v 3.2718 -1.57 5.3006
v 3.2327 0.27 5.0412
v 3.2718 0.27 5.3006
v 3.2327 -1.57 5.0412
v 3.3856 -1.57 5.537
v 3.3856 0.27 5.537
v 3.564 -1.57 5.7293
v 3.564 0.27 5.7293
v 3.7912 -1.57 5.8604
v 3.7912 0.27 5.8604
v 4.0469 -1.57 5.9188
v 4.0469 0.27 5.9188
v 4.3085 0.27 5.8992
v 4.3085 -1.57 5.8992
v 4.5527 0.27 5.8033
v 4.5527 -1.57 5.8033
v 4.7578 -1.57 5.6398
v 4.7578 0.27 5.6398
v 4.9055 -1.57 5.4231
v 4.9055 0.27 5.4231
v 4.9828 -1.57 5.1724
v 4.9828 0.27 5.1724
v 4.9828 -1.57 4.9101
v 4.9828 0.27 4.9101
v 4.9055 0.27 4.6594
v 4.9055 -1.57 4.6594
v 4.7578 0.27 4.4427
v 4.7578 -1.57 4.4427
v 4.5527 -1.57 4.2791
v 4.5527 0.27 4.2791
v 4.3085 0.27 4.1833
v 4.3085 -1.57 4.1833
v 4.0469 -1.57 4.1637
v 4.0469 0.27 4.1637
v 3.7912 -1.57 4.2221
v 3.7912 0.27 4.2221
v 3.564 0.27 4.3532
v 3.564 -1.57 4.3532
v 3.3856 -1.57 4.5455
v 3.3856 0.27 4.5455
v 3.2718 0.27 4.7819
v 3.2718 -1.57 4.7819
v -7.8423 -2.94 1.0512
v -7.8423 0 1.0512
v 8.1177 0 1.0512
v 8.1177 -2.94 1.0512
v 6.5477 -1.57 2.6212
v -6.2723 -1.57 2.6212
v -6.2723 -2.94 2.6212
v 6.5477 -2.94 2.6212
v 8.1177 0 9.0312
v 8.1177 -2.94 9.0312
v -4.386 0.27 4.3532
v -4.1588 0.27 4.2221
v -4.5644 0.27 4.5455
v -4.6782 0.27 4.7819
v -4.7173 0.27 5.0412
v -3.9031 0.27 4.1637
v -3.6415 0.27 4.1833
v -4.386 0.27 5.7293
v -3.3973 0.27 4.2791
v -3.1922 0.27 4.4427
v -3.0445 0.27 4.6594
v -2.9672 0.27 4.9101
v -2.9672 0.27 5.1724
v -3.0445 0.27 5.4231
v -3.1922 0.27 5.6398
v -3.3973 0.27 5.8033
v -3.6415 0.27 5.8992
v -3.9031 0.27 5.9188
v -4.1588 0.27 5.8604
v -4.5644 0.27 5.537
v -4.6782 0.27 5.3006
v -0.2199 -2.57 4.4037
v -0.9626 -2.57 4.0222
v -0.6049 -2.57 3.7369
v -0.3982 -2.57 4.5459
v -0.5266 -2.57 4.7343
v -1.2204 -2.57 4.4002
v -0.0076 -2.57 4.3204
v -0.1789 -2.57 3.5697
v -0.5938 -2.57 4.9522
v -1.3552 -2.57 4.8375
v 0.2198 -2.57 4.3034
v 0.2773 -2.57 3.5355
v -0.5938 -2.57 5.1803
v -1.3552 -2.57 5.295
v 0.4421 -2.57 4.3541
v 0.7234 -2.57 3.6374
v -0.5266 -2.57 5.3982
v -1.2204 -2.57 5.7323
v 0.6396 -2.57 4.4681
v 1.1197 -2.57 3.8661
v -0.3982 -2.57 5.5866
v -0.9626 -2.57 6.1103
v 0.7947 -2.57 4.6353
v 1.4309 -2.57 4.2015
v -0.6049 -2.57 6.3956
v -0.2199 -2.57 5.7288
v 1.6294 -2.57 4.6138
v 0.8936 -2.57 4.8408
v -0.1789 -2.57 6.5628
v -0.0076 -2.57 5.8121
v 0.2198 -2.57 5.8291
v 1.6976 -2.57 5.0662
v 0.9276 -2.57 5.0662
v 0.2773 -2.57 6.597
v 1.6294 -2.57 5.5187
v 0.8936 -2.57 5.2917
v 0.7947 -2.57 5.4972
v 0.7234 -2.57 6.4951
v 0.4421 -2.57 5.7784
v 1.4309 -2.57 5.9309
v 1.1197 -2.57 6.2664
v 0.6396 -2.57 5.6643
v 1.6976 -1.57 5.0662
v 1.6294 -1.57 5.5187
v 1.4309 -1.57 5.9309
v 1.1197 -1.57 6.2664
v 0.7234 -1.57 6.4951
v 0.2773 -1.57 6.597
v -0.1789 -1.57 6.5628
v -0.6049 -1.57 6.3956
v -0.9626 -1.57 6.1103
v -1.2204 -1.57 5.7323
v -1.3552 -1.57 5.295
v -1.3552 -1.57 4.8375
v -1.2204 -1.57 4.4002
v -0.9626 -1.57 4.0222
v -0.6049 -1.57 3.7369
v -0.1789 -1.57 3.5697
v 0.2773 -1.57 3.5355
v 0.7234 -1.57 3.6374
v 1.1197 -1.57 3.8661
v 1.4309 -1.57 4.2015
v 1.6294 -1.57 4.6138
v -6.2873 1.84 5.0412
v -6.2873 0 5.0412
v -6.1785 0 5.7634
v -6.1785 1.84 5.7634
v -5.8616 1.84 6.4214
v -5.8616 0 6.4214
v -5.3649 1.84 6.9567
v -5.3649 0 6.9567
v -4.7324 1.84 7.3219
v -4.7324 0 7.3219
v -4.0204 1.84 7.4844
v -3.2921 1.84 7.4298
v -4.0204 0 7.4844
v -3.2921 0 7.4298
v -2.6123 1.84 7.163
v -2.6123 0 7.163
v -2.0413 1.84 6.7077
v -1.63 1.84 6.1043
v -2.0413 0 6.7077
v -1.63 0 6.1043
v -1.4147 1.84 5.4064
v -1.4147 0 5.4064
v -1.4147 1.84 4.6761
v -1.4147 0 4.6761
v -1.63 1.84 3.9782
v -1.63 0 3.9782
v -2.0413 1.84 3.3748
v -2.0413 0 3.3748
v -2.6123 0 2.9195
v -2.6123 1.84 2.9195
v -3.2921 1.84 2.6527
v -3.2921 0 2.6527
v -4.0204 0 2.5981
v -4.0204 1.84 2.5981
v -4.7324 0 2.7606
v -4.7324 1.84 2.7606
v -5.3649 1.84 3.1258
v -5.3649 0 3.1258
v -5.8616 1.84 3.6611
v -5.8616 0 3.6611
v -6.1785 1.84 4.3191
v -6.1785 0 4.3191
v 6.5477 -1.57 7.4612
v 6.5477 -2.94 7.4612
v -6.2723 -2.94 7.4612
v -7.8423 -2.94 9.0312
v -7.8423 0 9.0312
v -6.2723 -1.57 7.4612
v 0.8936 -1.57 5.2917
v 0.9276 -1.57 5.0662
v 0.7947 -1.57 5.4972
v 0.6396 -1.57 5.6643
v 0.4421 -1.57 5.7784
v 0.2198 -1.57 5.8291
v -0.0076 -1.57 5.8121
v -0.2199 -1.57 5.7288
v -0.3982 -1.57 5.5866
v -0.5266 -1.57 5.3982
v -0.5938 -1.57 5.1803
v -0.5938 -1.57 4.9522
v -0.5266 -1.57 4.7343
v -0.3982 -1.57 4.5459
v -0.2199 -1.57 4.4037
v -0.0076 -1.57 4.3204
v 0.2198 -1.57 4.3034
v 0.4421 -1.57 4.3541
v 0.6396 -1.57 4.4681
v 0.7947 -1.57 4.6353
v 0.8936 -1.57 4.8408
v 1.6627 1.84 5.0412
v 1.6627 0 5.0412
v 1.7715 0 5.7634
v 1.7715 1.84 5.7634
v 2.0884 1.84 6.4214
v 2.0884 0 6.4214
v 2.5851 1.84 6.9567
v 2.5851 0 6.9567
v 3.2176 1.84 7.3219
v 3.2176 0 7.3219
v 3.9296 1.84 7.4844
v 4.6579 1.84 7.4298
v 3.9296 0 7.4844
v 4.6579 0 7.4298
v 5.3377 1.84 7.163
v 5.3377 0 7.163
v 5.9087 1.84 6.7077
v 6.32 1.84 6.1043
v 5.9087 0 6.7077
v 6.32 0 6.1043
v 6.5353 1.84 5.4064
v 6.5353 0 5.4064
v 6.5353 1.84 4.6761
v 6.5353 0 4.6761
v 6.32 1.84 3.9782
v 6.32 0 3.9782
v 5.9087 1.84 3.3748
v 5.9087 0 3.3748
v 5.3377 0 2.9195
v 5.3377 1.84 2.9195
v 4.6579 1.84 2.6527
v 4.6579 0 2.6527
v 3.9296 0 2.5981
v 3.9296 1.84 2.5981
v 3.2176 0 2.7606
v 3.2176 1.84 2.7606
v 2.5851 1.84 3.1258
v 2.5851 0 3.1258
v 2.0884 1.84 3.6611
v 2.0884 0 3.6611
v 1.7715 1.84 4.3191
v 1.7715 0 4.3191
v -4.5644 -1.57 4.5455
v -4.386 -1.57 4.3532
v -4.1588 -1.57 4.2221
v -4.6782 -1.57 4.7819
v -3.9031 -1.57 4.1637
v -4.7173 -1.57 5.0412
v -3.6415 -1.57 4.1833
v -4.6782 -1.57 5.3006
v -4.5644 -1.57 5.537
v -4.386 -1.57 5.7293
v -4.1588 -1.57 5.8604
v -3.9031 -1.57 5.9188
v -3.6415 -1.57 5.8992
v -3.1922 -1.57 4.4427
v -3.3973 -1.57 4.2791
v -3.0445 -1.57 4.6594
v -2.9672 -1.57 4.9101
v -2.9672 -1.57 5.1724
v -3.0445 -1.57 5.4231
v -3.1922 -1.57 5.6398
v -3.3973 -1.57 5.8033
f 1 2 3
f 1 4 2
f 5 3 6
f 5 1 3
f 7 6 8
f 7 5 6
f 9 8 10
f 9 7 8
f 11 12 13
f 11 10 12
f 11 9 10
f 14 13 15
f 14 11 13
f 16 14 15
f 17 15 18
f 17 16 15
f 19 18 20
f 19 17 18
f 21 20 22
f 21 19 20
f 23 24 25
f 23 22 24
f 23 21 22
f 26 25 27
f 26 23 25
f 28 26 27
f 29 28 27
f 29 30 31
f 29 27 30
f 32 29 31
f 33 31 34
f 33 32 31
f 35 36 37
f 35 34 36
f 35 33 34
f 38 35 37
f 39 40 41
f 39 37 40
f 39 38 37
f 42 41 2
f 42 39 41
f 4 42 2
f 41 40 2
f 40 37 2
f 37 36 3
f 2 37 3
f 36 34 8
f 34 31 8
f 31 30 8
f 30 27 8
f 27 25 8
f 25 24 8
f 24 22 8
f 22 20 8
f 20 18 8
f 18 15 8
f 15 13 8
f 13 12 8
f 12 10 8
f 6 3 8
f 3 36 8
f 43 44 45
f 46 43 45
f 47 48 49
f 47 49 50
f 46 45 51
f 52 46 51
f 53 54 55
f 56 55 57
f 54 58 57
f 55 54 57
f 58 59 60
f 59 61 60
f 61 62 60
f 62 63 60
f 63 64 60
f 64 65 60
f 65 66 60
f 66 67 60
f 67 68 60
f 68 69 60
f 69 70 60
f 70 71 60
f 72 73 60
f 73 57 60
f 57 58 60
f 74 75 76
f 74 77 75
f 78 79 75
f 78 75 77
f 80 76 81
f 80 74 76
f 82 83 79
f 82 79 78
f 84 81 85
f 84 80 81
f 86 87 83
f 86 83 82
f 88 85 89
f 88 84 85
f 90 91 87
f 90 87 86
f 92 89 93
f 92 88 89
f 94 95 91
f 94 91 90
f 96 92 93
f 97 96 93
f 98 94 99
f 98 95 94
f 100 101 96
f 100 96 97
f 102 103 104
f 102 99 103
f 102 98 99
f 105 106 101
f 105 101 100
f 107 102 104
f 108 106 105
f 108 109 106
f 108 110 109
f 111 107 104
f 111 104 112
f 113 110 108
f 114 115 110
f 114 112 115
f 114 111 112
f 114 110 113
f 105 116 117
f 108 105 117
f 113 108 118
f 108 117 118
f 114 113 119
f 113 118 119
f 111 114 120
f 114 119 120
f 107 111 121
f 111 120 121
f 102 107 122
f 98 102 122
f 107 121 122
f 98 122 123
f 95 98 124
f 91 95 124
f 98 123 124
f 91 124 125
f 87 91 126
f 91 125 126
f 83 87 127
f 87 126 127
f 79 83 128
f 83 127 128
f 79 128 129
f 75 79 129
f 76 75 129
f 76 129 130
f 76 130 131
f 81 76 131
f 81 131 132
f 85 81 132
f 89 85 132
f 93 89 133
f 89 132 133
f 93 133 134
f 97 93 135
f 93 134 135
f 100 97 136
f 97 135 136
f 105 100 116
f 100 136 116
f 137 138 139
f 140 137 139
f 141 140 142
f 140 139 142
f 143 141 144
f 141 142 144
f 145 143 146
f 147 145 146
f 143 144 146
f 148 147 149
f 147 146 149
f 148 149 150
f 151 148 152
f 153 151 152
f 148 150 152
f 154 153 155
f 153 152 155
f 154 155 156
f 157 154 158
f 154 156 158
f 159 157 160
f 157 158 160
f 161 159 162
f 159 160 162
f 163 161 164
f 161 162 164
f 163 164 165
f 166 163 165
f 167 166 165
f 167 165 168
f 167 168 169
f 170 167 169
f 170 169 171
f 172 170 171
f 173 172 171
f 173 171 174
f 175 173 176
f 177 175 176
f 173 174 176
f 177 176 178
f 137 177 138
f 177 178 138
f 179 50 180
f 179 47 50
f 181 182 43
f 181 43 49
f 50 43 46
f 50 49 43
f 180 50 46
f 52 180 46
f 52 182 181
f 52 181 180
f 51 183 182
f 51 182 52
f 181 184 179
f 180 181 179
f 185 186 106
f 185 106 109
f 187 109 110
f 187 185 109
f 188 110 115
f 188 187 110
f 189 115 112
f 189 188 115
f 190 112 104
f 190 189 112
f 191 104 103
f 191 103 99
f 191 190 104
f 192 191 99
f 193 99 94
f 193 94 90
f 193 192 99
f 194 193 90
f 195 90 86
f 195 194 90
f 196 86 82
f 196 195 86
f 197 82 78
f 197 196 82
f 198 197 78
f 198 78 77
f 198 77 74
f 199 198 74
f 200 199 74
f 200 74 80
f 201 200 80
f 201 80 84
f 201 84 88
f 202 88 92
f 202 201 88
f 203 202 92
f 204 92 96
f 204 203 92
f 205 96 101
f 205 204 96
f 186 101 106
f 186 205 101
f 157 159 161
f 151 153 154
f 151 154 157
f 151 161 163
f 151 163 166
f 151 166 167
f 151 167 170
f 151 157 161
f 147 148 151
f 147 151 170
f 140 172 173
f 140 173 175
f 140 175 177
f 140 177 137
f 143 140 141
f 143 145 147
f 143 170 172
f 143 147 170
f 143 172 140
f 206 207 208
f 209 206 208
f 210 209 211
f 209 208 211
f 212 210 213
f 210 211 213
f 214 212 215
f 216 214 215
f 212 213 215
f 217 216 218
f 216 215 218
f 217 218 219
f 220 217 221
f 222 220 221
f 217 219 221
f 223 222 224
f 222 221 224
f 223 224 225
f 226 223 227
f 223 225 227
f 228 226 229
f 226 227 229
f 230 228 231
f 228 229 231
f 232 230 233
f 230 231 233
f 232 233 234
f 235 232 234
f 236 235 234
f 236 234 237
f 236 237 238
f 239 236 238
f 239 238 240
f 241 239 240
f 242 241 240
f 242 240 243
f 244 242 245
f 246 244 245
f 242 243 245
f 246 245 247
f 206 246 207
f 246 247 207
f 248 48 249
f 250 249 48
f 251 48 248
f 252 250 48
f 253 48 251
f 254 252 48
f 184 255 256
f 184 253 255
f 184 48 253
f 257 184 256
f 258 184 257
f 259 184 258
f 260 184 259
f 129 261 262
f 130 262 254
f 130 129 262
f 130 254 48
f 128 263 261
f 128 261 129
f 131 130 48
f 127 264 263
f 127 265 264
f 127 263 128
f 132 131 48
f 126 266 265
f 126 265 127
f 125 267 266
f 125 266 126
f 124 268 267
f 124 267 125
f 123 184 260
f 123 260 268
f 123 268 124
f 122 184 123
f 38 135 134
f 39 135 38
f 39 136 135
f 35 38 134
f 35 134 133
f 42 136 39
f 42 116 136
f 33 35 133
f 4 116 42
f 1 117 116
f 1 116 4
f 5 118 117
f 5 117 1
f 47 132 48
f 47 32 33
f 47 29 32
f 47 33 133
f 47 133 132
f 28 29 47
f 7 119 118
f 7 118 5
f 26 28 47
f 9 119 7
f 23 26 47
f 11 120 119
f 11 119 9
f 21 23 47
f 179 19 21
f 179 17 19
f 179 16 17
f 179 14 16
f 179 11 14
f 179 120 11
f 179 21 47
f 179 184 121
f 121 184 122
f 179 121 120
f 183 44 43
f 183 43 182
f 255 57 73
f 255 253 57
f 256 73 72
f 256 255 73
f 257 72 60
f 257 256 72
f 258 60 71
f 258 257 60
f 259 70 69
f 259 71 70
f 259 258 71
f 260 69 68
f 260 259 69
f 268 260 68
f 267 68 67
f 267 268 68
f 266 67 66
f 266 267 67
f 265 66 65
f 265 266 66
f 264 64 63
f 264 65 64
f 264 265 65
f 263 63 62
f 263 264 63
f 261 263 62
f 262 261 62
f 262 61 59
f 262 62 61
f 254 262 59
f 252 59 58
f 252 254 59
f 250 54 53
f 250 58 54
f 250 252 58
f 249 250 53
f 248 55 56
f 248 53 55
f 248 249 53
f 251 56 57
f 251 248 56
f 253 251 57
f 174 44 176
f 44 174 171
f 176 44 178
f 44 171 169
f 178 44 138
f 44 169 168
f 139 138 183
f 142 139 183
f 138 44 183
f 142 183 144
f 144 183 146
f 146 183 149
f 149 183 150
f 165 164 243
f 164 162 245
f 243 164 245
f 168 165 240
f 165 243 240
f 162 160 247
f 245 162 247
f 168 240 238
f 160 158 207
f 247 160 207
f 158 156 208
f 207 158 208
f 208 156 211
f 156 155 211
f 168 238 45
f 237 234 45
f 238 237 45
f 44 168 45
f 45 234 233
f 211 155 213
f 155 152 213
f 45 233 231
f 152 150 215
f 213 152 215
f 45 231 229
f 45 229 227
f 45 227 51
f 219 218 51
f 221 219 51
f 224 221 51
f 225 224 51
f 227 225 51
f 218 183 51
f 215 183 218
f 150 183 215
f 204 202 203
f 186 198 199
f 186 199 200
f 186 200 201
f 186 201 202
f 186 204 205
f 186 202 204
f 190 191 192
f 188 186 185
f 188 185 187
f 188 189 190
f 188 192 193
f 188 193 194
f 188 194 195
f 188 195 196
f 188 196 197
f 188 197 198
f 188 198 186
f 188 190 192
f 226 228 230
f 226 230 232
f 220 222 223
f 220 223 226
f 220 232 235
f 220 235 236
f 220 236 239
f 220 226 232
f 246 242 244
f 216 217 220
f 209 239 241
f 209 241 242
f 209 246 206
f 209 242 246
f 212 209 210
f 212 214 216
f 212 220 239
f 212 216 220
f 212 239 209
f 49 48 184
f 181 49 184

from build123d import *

# Parameters (mm, degrees)
F0_W     = 15.96
F0_H     = 7.98
F1_DEPTH = 2.94
F2_R     = 2.45
F3_DEPTH = 1.84
F4_T     = -1.57
F5_R     = 1.535
F5_R_2   = 0.765
F6_DEPTH = 1


with BuildPart() as f1:
    # F0 (on Front) → F1 (new body)
    with BuildSketch(Plane.XZ):
        with Locations((0.1376755536, 5.0412456957)):
            Rectangle(F0_W, F0_H)
    extrude(amount=F1_DEPTH)

    # F2 (on face) → F3 (join)
    with BuildSketch(Plane(origin=(0, 0, 0), x_dir=(-1, 0, 0), z_dir=(0, 1, 0))):
        with Locations((3.8373244464, 5.0412456957)):
            Circle(F2_R)
        with Locations((-4.1126755536, 5.0412456957)):
            Circle(F2_R)
    extrude(amount=F3_DEPTH)

    # F4
    f4_openings = [f1.faces().sort_by_distance(p)[0] for p in [
        (0.137676, -2.94, 5.041246),
    ]]
    offset(amount=F4_T, openings=f4_openings, kind=Kind.INTERSECTION)

    # F5 (on face) → F6 (join)
    with BuildSketch(Plane.XZ.offset(1.57)):
        with Locations((0.1626269908, 5.0662456957)):
            Circle(F5_R)
        with Locations((0.1626269908, 5.0662456957)):
            Circle(F5_R_2, mode=Mode.SUBTRACT)
    extrude(amount=F6_DEPTH)


solid = f1.part
